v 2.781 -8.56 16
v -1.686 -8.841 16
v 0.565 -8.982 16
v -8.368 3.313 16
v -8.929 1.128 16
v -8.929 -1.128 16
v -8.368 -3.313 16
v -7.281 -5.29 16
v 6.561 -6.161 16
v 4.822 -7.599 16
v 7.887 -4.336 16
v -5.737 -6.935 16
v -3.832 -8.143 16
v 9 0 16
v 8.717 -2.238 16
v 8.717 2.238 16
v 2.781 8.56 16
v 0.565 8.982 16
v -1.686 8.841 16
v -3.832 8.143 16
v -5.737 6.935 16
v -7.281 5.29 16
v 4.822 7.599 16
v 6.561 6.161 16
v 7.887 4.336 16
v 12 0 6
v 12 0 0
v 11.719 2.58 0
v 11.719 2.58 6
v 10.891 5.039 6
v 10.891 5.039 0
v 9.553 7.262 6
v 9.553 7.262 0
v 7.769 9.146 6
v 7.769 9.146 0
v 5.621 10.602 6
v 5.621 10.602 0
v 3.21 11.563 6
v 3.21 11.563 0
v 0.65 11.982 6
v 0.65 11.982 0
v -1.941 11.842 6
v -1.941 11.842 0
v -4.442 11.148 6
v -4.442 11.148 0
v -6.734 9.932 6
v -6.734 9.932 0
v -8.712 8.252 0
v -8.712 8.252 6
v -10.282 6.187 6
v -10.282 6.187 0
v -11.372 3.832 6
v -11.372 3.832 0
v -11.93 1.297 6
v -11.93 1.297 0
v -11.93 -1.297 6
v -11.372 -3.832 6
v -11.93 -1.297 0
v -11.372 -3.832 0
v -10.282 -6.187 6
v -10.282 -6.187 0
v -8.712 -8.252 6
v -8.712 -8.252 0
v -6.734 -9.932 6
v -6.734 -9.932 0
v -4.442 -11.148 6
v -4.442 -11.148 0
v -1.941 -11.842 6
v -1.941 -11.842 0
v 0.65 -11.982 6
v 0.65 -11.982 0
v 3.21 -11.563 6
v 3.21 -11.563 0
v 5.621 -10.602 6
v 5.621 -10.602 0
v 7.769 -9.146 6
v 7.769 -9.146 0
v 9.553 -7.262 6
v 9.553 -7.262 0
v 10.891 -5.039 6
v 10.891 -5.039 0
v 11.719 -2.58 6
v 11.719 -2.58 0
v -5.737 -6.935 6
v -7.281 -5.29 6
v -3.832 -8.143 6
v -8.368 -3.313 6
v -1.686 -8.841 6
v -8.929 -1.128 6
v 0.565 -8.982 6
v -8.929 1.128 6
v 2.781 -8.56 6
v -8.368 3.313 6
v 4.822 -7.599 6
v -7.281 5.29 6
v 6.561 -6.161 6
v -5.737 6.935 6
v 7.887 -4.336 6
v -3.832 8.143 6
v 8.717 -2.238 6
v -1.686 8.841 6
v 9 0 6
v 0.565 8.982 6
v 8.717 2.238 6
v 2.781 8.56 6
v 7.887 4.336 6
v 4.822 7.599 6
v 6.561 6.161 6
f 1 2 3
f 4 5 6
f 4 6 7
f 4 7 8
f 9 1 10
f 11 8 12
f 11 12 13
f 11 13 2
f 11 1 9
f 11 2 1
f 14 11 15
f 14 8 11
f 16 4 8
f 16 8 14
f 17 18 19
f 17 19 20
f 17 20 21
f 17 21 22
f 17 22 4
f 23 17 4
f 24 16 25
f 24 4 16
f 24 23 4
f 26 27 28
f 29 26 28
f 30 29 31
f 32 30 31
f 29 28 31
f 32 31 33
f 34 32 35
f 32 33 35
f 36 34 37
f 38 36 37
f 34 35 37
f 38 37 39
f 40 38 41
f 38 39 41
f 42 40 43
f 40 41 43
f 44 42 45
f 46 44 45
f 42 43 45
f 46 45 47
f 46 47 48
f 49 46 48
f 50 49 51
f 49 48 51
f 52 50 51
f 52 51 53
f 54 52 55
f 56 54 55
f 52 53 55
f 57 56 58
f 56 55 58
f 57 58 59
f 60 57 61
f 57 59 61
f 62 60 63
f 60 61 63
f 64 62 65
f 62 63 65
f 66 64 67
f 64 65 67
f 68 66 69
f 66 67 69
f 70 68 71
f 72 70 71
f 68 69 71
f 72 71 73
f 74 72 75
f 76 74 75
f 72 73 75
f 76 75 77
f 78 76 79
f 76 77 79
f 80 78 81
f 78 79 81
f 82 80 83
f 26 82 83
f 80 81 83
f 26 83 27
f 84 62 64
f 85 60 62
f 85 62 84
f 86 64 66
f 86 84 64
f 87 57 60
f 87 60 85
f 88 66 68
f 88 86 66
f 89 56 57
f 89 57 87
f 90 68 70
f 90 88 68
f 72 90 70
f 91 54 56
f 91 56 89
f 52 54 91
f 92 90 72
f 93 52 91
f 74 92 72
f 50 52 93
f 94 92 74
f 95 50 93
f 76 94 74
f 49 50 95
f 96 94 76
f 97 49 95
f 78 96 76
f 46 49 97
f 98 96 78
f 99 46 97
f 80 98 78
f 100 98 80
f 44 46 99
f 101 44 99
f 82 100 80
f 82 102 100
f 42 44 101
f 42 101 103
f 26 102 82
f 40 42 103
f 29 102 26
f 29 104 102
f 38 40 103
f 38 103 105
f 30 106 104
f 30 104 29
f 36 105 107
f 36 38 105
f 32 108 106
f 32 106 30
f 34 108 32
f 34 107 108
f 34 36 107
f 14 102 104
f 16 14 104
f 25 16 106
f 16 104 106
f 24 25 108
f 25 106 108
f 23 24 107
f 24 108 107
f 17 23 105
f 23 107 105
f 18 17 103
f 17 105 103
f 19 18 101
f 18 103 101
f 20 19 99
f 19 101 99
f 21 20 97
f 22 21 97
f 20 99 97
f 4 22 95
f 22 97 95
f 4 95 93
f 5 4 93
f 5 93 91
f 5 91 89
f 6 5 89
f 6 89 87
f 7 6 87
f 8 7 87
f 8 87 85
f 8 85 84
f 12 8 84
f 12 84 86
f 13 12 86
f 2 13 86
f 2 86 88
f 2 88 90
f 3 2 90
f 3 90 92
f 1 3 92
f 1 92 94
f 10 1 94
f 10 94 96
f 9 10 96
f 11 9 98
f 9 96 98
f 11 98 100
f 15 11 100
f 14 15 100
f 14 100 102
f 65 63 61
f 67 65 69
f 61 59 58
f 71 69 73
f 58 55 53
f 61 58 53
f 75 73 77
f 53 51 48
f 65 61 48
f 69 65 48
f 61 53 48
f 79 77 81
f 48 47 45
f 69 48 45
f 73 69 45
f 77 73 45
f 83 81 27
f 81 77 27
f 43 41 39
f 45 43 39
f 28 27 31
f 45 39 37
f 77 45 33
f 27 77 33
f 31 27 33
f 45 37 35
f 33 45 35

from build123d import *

# Parameters (mm, degrees)
CYLINDER_R        = 12
CYLINDER_DEPTH    = 6
CYLINDER001_R     = 9
CYLINDER001_DEPTH = 16


with BuildPart() as cylinder:
    # Cylinder → Cylinder (new body)
    with BuildSketch(Plane.XY):
        Circle(CYLINDER_R)
    extrude(amount=CYLINDER_DEPTH)


with BuildPart() as fusion:
    # Cylinder001 → Cylinder001 (new body)
    with BuildSketch(Plane.XY):
        Circle(CYLINDER001_R)
    extrude(amount=CYLINDER001_DEPTH)

    # Fusion: union Cylinder
    add(cylinder.part)


solid = fusion.part
